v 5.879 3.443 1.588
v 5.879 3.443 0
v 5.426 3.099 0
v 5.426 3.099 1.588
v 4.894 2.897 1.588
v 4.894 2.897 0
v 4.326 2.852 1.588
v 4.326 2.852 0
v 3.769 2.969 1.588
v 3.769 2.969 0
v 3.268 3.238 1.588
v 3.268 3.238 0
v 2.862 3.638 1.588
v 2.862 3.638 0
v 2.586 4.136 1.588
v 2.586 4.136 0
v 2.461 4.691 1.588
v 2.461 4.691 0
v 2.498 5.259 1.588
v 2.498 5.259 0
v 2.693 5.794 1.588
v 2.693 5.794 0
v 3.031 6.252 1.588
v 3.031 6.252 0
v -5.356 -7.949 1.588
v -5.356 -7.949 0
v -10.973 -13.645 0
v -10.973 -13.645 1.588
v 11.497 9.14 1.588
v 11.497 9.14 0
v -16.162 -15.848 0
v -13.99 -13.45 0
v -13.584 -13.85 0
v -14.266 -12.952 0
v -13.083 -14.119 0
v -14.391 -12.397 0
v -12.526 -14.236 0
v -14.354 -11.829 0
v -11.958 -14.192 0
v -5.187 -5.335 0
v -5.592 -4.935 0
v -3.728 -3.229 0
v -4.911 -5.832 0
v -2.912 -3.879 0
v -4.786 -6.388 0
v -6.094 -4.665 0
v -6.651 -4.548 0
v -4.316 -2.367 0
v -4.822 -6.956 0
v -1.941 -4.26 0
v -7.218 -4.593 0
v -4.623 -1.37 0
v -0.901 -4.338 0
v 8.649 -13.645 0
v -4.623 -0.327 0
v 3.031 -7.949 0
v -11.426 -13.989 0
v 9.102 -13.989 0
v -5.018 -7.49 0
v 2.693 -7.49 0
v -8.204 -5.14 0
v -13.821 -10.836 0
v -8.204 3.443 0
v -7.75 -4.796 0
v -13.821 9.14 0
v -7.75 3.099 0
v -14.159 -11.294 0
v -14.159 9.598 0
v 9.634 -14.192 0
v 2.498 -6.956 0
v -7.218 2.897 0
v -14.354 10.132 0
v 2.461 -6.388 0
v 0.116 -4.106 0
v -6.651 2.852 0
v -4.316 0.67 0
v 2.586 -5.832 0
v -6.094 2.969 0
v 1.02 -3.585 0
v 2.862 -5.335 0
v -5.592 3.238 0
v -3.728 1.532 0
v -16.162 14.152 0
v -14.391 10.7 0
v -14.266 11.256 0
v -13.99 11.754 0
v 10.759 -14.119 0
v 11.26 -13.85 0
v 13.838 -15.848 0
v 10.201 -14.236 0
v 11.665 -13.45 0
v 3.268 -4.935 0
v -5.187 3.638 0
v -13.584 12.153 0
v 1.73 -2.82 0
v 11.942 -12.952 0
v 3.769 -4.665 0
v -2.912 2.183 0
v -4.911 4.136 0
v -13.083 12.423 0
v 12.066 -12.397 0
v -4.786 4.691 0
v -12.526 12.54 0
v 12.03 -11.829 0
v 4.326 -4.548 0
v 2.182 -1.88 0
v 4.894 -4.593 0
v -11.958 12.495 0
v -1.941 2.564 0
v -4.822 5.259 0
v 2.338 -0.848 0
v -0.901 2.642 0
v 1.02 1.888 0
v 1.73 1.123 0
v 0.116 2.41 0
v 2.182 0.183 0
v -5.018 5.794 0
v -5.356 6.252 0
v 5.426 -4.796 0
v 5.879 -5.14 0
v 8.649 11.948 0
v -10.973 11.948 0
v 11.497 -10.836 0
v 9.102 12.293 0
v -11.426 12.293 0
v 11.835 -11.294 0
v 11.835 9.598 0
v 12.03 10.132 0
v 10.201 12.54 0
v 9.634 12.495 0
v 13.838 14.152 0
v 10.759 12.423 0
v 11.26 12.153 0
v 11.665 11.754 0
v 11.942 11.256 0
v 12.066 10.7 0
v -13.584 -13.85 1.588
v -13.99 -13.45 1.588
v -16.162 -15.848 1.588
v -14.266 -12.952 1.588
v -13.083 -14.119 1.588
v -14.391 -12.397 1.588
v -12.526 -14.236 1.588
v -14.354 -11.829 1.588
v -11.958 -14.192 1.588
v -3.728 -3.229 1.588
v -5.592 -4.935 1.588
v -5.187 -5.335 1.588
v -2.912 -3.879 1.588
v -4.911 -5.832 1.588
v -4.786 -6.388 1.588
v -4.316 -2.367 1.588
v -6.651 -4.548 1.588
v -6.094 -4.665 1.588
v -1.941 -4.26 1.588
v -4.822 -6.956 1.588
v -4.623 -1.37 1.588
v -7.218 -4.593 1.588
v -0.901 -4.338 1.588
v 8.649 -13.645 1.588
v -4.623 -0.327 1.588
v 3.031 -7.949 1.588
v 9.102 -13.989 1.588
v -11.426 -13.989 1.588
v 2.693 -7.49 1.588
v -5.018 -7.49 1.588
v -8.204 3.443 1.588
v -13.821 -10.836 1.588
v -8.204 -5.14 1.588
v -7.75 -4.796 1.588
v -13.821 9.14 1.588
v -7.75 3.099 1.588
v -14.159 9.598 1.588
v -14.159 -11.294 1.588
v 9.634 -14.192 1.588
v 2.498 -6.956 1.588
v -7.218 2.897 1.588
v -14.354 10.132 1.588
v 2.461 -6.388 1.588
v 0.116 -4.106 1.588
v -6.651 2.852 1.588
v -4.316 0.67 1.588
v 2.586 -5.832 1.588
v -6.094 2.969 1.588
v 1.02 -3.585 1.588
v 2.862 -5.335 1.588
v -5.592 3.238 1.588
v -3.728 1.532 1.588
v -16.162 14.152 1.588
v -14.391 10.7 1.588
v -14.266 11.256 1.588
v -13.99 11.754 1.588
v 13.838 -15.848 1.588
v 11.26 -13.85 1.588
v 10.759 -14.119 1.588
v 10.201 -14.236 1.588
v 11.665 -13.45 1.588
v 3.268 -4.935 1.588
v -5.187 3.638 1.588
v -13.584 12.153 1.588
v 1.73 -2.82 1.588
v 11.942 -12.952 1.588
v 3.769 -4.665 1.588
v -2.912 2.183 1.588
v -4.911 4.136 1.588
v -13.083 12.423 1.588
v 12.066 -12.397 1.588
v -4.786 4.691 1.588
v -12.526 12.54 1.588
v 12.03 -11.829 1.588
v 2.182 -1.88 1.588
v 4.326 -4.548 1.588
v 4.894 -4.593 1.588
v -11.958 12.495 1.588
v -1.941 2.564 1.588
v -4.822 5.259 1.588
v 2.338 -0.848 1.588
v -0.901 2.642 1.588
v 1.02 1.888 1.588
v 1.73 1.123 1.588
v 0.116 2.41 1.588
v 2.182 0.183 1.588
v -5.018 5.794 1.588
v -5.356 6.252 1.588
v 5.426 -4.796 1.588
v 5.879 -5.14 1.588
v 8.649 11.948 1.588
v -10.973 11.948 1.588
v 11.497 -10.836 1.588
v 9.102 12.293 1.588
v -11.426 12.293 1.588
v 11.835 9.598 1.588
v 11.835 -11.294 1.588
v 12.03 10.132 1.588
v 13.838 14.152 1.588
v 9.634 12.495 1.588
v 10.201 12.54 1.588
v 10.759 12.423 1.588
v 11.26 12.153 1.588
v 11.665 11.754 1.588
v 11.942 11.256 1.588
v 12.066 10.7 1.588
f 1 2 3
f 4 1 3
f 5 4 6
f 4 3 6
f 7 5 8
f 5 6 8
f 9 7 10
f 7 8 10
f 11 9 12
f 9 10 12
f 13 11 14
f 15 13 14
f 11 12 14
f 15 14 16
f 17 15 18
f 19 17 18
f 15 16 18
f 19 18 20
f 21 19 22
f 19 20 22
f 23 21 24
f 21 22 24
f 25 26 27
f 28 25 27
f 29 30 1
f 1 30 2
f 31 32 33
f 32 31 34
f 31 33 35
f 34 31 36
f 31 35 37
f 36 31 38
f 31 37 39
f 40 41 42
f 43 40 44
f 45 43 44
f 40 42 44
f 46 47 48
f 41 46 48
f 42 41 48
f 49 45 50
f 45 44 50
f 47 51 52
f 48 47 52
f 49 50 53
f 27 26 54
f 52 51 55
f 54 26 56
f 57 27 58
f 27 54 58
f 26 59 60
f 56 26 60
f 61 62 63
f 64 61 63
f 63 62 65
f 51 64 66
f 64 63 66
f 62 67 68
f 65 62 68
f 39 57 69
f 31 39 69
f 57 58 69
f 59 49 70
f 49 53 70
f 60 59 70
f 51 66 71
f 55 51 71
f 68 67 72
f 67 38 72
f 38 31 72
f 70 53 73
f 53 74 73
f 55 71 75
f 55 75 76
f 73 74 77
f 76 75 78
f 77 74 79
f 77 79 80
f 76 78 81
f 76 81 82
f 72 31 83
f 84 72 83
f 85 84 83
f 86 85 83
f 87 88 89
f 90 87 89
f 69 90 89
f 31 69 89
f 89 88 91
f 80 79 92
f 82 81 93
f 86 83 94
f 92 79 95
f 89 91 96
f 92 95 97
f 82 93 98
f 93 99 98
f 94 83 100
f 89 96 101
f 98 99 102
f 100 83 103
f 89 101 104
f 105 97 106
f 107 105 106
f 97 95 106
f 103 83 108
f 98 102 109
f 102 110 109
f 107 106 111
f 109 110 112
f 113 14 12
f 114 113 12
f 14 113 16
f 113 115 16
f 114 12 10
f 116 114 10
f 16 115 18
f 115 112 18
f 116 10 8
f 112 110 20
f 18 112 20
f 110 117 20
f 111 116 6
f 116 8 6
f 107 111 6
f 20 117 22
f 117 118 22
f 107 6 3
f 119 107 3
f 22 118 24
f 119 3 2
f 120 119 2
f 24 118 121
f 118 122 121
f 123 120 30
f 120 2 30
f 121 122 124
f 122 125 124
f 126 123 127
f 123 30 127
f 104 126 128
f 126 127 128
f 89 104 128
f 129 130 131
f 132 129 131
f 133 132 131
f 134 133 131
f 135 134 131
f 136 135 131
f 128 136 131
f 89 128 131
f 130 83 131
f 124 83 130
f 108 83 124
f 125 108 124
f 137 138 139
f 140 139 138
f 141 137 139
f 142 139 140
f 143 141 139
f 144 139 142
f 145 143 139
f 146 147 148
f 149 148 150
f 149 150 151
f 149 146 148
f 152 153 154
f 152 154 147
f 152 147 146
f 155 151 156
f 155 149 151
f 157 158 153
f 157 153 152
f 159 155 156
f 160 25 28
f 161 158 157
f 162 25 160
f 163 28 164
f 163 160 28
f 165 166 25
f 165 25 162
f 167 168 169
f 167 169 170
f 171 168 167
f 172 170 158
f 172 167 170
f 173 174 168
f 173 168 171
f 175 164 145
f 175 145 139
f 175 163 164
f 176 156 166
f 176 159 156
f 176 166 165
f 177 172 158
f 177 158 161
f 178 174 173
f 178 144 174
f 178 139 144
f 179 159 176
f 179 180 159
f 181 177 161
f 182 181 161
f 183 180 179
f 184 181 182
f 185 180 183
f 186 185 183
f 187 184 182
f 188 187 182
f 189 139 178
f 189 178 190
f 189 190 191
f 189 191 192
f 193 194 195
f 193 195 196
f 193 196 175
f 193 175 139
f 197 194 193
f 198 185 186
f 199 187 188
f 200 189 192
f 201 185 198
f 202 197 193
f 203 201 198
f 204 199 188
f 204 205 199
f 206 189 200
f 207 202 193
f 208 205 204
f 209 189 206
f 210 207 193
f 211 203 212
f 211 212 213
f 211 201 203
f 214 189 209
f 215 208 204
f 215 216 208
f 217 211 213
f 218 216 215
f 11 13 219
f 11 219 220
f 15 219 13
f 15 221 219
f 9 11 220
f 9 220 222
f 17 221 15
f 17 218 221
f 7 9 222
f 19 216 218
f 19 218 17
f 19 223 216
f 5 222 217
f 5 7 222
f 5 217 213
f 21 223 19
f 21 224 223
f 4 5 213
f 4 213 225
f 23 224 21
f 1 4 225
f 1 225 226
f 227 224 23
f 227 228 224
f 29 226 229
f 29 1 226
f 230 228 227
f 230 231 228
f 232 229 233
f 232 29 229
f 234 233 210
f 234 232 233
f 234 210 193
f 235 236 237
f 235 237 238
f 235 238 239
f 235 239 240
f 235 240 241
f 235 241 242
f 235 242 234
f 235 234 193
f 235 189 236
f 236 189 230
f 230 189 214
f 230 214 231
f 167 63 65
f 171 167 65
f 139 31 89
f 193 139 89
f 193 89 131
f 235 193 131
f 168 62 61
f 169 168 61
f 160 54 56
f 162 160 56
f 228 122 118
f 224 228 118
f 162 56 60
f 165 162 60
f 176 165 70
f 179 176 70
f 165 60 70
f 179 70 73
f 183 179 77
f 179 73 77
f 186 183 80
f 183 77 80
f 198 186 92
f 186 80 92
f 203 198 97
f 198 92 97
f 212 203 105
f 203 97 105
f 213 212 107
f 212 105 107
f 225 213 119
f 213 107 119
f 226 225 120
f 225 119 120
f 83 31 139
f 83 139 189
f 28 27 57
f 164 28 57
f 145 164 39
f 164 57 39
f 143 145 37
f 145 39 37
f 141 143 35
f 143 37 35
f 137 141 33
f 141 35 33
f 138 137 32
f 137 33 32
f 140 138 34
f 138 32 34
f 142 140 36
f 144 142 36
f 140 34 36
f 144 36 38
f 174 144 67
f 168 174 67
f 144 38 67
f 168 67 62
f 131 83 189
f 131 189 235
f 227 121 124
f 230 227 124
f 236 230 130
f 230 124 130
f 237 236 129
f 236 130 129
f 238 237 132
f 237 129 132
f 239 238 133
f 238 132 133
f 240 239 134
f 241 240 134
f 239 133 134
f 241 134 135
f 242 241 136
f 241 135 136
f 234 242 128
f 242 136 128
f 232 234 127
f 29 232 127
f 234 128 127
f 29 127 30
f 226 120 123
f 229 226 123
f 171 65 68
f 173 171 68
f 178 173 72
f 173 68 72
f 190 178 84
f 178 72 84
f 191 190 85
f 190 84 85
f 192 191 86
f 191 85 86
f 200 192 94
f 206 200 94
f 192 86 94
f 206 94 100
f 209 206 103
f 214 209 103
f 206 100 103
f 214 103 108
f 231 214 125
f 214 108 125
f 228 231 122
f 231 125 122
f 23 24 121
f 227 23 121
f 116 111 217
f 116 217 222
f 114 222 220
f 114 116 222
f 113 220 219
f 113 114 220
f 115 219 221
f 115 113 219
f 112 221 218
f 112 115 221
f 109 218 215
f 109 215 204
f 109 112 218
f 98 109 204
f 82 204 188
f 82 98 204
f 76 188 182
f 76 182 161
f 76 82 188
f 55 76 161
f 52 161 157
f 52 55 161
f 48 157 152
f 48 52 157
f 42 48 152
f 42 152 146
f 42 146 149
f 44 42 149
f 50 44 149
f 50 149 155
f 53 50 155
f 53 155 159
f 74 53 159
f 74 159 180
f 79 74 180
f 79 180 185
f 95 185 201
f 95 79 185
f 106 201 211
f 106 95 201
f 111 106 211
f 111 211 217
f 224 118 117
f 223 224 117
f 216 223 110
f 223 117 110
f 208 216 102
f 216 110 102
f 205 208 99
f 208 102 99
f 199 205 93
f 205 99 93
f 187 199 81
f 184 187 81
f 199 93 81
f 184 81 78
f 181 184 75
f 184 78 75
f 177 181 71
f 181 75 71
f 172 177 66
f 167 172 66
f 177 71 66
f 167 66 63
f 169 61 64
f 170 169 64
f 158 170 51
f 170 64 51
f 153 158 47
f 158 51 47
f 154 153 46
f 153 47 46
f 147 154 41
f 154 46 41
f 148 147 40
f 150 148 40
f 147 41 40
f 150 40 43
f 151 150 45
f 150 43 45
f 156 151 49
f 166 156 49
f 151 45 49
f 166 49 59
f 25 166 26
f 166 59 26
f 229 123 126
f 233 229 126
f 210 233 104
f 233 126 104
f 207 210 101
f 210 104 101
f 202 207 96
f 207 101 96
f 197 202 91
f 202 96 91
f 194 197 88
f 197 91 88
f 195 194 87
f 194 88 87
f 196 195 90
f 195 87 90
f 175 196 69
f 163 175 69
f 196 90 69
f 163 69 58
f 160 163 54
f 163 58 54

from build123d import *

# Parameters (mm, degrees)
F0_W     = 30
F0_H     = 30
F0_R     = 3.5
F1_DEPTH = 1.5875


# Not quite as in the source:
# - a length typed as a fraction of an inch, garbled in the dataset ("3 / 203.2 mm" for 3/8 in), is restored


with BuildPart() as f1:
    # F0 (on Top) → F1 (new body)
    with BuildSketch(Plane.XY):
        with Locations((-1.1622245609, -0.8481781135)):
            Rectangle(F0_W, F0_H)
        with BuildLine():
            Line((-13.8210662203, -10.8358568401), (-8.2036473316, -5.1398402471))
            ThreePointArc((-8.2036473316, -5.1398402471), (-5.3752884611, -5.120190821), (-5.355639035, -7.9485496914))
            Line((-5.355639035, -7.9485496914), (-10.9730579238, -13.6445662845))
            ThreePointArc((-10.9730579238, -13.6445662845), (-13.8014167942, -13.6642157105), (-13.8210662203, -10.8358568401))
        make_face(mode=Mode.SUBTRACT)
        with BuildLine():
            ThreePointArc((3.0311899132, -7.9485496914), (3.0508393392, -5.120190821), (5.8791982097, -5.1398402471))
            Line((5.8791982097, -5.1398402471), (11.4966170985, -10.8358568401))
            ThreePointArc((11.4966170985, -10.8358568401), (11.4769676724, -13.6642157105), (8.6486088019, -13.6445662845))
            Line((8.6486088019, -13.6445662845), (3.0311899132, -7.9485496914))
        make_face(mode=Mode.SUBTRACT)
        with Locations((-1.1622245609, -0.8481781135)):
            Circle(F0_R, mode=Mode.SUBTRACT)
        with BuildLine():
            ThreePointArc((-5.355639035, 6.2521934645), (-5.3752884611, 3.423834594), (-8.2036473316, 3.4434840201))
            Line((-8.2036473316, 3.4434840201), (-13.8210662203, 9.1395006131))
            ThreePointArc((-13.8210662203, 9.1395006131), (-13.8014167942, 11.9678594836), (-10.9730579238, 11.9482100575))
            Line((-10.9730579238, 11.9482100575), (-5.355639035, 6.2521934645))
        make_face(mode=Mode.SUBTRACT)
        with BuildLine():
            Line((3.0311899132, 6.2521934645), (8.6486088019, 11.9482100575))
            ThreePointArc((8.6486088019, 11.9482100575), (11.4769676724, 11.9678594836), (11.4966170985, 9.1395006131))
            Line((11.4966170985, 9.1395006131), (5.8791982097, 3.4434840201))
            ThreePointArc((5.8791982097, 3.4434840201), (3.0508393392, 3.423834594), (3.0311899132, 6.2521934645))
        make_face(mode=Mode.SUBTRACT)
    extrude(amount=F1_DEPTH)


solid = f1.part
